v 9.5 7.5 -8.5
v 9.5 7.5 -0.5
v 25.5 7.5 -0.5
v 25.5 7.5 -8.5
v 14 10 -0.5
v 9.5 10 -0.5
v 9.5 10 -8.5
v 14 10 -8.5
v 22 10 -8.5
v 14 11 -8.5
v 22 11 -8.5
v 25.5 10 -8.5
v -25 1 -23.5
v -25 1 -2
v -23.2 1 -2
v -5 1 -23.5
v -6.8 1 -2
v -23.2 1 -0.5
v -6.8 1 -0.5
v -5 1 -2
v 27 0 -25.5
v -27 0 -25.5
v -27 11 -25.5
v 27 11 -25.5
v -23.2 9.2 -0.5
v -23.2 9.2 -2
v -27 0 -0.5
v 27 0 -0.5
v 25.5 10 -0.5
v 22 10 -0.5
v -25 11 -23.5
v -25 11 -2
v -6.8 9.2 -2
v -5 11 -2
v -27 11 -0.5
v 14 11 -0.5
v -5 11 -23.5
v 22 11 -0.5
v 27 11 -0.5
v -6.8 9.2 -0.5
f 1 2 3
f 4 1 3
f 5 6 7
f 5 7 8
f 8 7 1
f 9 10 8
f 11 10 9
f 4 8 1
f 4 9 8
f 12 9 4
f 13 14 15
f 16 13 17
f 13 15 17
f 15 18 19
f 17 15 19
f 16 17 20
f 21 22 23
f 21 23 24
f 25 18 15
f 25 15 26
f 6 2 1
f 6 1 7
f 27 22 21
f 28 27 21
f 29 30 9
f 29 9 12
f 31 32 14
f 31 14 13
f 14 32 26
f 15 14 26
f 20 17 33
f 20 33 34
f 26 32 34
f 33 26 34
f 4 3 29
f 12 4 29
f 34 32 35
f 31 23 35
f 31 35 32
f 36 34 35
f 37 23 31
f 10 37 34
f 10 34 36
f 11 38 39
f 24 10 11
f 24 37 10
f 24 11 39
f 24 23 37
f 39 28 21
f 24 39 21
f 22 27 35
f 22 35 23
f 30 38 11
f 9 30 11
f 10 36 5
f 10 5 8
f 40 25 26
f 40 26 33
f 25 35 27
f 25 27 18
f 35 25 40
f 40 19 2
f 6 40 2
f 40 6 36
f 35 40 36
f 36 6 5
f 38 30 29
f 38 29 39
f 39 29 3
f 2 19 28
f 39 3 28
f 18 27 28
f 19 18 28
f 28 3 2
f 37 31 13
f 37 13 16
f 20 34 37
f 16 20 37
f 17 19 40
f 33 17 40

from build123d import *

# Parameters (mm, degrees)
SKETCH8_W            = 54
SKETCH8_H            = 25
BOSS_EXTRUDE1_DEPTH  = 11
SKETCH9_W            = 20
SKETCH9_H            = 21.5
CUT_EXTRUDE1_DEPTH   = 10
SKETCH11_W           = 8
SKETCH11_H           = 8
CUT_EXTRUDE5_DEPTH   = 3.5
JOYSTICK_ENTRY_REACH = 40.406
SKETCH10_W           = 16.4
SKETCH10_H           = 8.2
SKETCH13_W           = 16
SKETCH13_H           = 2.5
CUT_EXTRUDE6_DEPTH   = 8


with BuildPart() as part:
    # Sketch8 → Boss-Extrude1 (new body)
    with BuildSketch(Plane(origin=(0, 0, 0), x_dir=(1, 0, 0), z_dir=(0, 1, 0))):
        with Locations((0, 13)):
            Rectangle(SKETCH8_W, SKETCH8_H)
    extrude(amount=BOSS_EXTRUDE1_DEPTH)

    # Sketch9 → Cut-Extrude1 (cut)
    with BuildSketch(Plane(origin=(0, 11, 0), x_dir=(1, 0, 0), z_dir=(0, 1, 0))):
        with Locations((-15, 12.75)):
            Rectangle(SKETCH9_W, SKETCH9_H)
    extrude(amount=-CUT_EXTRUDE1_DEPTH, mode=Mode.SUBTRACT)

    # Sketch11 → Cut-Extrude5 (cut)
    with BuildSketch(Plane(origin=(0, 11, 0), x_dir=(1, 0, 0), z_dir=(0, 1, 0))):
        with Locations((18, 4.5)):
            Rectangle(SKETCH11_W, SKETCH11_H)
    extrude(amount=-CUT_EXTRUDE5_DEPTH, mode=Mode.SUBTRACT)

    # Sketch10 → Joystick Entry (cut, up to next)
    with BuildSketch(Plane.XY.offset(-0.5), mode=Mode.PRIVATE) as joystick_entry_sk1:
        with Locations((-15, 5.1)):
            Rectangle(SKETCH10_W, SKETCH10_H)
    joystick_entry_tool1 = extrude(joystick_entry_sk1.sketch, amount=-JOYSTICK_ENTRY_REACH, mode=Mode.PRIVATE) & part.part
    add(joystick_entry_tool1.solids().sort_by_distance((-15, 5.1, -0.5))[0], mode=Mode.SUBTRACT)

    # Sketch13 → Cut-Extrude6 (cut)
    with BuildSketch(Plane.XY.offset(-0.5)):
        with Locations((17.5, 8.75)):
            Rectangle(SKETCH13_W, SKETCH13_H)
    extrude(amount=-CUT_EXTRUDE6_DEPTH, mode=Mode.SUBTRACT)


solid = part.part
